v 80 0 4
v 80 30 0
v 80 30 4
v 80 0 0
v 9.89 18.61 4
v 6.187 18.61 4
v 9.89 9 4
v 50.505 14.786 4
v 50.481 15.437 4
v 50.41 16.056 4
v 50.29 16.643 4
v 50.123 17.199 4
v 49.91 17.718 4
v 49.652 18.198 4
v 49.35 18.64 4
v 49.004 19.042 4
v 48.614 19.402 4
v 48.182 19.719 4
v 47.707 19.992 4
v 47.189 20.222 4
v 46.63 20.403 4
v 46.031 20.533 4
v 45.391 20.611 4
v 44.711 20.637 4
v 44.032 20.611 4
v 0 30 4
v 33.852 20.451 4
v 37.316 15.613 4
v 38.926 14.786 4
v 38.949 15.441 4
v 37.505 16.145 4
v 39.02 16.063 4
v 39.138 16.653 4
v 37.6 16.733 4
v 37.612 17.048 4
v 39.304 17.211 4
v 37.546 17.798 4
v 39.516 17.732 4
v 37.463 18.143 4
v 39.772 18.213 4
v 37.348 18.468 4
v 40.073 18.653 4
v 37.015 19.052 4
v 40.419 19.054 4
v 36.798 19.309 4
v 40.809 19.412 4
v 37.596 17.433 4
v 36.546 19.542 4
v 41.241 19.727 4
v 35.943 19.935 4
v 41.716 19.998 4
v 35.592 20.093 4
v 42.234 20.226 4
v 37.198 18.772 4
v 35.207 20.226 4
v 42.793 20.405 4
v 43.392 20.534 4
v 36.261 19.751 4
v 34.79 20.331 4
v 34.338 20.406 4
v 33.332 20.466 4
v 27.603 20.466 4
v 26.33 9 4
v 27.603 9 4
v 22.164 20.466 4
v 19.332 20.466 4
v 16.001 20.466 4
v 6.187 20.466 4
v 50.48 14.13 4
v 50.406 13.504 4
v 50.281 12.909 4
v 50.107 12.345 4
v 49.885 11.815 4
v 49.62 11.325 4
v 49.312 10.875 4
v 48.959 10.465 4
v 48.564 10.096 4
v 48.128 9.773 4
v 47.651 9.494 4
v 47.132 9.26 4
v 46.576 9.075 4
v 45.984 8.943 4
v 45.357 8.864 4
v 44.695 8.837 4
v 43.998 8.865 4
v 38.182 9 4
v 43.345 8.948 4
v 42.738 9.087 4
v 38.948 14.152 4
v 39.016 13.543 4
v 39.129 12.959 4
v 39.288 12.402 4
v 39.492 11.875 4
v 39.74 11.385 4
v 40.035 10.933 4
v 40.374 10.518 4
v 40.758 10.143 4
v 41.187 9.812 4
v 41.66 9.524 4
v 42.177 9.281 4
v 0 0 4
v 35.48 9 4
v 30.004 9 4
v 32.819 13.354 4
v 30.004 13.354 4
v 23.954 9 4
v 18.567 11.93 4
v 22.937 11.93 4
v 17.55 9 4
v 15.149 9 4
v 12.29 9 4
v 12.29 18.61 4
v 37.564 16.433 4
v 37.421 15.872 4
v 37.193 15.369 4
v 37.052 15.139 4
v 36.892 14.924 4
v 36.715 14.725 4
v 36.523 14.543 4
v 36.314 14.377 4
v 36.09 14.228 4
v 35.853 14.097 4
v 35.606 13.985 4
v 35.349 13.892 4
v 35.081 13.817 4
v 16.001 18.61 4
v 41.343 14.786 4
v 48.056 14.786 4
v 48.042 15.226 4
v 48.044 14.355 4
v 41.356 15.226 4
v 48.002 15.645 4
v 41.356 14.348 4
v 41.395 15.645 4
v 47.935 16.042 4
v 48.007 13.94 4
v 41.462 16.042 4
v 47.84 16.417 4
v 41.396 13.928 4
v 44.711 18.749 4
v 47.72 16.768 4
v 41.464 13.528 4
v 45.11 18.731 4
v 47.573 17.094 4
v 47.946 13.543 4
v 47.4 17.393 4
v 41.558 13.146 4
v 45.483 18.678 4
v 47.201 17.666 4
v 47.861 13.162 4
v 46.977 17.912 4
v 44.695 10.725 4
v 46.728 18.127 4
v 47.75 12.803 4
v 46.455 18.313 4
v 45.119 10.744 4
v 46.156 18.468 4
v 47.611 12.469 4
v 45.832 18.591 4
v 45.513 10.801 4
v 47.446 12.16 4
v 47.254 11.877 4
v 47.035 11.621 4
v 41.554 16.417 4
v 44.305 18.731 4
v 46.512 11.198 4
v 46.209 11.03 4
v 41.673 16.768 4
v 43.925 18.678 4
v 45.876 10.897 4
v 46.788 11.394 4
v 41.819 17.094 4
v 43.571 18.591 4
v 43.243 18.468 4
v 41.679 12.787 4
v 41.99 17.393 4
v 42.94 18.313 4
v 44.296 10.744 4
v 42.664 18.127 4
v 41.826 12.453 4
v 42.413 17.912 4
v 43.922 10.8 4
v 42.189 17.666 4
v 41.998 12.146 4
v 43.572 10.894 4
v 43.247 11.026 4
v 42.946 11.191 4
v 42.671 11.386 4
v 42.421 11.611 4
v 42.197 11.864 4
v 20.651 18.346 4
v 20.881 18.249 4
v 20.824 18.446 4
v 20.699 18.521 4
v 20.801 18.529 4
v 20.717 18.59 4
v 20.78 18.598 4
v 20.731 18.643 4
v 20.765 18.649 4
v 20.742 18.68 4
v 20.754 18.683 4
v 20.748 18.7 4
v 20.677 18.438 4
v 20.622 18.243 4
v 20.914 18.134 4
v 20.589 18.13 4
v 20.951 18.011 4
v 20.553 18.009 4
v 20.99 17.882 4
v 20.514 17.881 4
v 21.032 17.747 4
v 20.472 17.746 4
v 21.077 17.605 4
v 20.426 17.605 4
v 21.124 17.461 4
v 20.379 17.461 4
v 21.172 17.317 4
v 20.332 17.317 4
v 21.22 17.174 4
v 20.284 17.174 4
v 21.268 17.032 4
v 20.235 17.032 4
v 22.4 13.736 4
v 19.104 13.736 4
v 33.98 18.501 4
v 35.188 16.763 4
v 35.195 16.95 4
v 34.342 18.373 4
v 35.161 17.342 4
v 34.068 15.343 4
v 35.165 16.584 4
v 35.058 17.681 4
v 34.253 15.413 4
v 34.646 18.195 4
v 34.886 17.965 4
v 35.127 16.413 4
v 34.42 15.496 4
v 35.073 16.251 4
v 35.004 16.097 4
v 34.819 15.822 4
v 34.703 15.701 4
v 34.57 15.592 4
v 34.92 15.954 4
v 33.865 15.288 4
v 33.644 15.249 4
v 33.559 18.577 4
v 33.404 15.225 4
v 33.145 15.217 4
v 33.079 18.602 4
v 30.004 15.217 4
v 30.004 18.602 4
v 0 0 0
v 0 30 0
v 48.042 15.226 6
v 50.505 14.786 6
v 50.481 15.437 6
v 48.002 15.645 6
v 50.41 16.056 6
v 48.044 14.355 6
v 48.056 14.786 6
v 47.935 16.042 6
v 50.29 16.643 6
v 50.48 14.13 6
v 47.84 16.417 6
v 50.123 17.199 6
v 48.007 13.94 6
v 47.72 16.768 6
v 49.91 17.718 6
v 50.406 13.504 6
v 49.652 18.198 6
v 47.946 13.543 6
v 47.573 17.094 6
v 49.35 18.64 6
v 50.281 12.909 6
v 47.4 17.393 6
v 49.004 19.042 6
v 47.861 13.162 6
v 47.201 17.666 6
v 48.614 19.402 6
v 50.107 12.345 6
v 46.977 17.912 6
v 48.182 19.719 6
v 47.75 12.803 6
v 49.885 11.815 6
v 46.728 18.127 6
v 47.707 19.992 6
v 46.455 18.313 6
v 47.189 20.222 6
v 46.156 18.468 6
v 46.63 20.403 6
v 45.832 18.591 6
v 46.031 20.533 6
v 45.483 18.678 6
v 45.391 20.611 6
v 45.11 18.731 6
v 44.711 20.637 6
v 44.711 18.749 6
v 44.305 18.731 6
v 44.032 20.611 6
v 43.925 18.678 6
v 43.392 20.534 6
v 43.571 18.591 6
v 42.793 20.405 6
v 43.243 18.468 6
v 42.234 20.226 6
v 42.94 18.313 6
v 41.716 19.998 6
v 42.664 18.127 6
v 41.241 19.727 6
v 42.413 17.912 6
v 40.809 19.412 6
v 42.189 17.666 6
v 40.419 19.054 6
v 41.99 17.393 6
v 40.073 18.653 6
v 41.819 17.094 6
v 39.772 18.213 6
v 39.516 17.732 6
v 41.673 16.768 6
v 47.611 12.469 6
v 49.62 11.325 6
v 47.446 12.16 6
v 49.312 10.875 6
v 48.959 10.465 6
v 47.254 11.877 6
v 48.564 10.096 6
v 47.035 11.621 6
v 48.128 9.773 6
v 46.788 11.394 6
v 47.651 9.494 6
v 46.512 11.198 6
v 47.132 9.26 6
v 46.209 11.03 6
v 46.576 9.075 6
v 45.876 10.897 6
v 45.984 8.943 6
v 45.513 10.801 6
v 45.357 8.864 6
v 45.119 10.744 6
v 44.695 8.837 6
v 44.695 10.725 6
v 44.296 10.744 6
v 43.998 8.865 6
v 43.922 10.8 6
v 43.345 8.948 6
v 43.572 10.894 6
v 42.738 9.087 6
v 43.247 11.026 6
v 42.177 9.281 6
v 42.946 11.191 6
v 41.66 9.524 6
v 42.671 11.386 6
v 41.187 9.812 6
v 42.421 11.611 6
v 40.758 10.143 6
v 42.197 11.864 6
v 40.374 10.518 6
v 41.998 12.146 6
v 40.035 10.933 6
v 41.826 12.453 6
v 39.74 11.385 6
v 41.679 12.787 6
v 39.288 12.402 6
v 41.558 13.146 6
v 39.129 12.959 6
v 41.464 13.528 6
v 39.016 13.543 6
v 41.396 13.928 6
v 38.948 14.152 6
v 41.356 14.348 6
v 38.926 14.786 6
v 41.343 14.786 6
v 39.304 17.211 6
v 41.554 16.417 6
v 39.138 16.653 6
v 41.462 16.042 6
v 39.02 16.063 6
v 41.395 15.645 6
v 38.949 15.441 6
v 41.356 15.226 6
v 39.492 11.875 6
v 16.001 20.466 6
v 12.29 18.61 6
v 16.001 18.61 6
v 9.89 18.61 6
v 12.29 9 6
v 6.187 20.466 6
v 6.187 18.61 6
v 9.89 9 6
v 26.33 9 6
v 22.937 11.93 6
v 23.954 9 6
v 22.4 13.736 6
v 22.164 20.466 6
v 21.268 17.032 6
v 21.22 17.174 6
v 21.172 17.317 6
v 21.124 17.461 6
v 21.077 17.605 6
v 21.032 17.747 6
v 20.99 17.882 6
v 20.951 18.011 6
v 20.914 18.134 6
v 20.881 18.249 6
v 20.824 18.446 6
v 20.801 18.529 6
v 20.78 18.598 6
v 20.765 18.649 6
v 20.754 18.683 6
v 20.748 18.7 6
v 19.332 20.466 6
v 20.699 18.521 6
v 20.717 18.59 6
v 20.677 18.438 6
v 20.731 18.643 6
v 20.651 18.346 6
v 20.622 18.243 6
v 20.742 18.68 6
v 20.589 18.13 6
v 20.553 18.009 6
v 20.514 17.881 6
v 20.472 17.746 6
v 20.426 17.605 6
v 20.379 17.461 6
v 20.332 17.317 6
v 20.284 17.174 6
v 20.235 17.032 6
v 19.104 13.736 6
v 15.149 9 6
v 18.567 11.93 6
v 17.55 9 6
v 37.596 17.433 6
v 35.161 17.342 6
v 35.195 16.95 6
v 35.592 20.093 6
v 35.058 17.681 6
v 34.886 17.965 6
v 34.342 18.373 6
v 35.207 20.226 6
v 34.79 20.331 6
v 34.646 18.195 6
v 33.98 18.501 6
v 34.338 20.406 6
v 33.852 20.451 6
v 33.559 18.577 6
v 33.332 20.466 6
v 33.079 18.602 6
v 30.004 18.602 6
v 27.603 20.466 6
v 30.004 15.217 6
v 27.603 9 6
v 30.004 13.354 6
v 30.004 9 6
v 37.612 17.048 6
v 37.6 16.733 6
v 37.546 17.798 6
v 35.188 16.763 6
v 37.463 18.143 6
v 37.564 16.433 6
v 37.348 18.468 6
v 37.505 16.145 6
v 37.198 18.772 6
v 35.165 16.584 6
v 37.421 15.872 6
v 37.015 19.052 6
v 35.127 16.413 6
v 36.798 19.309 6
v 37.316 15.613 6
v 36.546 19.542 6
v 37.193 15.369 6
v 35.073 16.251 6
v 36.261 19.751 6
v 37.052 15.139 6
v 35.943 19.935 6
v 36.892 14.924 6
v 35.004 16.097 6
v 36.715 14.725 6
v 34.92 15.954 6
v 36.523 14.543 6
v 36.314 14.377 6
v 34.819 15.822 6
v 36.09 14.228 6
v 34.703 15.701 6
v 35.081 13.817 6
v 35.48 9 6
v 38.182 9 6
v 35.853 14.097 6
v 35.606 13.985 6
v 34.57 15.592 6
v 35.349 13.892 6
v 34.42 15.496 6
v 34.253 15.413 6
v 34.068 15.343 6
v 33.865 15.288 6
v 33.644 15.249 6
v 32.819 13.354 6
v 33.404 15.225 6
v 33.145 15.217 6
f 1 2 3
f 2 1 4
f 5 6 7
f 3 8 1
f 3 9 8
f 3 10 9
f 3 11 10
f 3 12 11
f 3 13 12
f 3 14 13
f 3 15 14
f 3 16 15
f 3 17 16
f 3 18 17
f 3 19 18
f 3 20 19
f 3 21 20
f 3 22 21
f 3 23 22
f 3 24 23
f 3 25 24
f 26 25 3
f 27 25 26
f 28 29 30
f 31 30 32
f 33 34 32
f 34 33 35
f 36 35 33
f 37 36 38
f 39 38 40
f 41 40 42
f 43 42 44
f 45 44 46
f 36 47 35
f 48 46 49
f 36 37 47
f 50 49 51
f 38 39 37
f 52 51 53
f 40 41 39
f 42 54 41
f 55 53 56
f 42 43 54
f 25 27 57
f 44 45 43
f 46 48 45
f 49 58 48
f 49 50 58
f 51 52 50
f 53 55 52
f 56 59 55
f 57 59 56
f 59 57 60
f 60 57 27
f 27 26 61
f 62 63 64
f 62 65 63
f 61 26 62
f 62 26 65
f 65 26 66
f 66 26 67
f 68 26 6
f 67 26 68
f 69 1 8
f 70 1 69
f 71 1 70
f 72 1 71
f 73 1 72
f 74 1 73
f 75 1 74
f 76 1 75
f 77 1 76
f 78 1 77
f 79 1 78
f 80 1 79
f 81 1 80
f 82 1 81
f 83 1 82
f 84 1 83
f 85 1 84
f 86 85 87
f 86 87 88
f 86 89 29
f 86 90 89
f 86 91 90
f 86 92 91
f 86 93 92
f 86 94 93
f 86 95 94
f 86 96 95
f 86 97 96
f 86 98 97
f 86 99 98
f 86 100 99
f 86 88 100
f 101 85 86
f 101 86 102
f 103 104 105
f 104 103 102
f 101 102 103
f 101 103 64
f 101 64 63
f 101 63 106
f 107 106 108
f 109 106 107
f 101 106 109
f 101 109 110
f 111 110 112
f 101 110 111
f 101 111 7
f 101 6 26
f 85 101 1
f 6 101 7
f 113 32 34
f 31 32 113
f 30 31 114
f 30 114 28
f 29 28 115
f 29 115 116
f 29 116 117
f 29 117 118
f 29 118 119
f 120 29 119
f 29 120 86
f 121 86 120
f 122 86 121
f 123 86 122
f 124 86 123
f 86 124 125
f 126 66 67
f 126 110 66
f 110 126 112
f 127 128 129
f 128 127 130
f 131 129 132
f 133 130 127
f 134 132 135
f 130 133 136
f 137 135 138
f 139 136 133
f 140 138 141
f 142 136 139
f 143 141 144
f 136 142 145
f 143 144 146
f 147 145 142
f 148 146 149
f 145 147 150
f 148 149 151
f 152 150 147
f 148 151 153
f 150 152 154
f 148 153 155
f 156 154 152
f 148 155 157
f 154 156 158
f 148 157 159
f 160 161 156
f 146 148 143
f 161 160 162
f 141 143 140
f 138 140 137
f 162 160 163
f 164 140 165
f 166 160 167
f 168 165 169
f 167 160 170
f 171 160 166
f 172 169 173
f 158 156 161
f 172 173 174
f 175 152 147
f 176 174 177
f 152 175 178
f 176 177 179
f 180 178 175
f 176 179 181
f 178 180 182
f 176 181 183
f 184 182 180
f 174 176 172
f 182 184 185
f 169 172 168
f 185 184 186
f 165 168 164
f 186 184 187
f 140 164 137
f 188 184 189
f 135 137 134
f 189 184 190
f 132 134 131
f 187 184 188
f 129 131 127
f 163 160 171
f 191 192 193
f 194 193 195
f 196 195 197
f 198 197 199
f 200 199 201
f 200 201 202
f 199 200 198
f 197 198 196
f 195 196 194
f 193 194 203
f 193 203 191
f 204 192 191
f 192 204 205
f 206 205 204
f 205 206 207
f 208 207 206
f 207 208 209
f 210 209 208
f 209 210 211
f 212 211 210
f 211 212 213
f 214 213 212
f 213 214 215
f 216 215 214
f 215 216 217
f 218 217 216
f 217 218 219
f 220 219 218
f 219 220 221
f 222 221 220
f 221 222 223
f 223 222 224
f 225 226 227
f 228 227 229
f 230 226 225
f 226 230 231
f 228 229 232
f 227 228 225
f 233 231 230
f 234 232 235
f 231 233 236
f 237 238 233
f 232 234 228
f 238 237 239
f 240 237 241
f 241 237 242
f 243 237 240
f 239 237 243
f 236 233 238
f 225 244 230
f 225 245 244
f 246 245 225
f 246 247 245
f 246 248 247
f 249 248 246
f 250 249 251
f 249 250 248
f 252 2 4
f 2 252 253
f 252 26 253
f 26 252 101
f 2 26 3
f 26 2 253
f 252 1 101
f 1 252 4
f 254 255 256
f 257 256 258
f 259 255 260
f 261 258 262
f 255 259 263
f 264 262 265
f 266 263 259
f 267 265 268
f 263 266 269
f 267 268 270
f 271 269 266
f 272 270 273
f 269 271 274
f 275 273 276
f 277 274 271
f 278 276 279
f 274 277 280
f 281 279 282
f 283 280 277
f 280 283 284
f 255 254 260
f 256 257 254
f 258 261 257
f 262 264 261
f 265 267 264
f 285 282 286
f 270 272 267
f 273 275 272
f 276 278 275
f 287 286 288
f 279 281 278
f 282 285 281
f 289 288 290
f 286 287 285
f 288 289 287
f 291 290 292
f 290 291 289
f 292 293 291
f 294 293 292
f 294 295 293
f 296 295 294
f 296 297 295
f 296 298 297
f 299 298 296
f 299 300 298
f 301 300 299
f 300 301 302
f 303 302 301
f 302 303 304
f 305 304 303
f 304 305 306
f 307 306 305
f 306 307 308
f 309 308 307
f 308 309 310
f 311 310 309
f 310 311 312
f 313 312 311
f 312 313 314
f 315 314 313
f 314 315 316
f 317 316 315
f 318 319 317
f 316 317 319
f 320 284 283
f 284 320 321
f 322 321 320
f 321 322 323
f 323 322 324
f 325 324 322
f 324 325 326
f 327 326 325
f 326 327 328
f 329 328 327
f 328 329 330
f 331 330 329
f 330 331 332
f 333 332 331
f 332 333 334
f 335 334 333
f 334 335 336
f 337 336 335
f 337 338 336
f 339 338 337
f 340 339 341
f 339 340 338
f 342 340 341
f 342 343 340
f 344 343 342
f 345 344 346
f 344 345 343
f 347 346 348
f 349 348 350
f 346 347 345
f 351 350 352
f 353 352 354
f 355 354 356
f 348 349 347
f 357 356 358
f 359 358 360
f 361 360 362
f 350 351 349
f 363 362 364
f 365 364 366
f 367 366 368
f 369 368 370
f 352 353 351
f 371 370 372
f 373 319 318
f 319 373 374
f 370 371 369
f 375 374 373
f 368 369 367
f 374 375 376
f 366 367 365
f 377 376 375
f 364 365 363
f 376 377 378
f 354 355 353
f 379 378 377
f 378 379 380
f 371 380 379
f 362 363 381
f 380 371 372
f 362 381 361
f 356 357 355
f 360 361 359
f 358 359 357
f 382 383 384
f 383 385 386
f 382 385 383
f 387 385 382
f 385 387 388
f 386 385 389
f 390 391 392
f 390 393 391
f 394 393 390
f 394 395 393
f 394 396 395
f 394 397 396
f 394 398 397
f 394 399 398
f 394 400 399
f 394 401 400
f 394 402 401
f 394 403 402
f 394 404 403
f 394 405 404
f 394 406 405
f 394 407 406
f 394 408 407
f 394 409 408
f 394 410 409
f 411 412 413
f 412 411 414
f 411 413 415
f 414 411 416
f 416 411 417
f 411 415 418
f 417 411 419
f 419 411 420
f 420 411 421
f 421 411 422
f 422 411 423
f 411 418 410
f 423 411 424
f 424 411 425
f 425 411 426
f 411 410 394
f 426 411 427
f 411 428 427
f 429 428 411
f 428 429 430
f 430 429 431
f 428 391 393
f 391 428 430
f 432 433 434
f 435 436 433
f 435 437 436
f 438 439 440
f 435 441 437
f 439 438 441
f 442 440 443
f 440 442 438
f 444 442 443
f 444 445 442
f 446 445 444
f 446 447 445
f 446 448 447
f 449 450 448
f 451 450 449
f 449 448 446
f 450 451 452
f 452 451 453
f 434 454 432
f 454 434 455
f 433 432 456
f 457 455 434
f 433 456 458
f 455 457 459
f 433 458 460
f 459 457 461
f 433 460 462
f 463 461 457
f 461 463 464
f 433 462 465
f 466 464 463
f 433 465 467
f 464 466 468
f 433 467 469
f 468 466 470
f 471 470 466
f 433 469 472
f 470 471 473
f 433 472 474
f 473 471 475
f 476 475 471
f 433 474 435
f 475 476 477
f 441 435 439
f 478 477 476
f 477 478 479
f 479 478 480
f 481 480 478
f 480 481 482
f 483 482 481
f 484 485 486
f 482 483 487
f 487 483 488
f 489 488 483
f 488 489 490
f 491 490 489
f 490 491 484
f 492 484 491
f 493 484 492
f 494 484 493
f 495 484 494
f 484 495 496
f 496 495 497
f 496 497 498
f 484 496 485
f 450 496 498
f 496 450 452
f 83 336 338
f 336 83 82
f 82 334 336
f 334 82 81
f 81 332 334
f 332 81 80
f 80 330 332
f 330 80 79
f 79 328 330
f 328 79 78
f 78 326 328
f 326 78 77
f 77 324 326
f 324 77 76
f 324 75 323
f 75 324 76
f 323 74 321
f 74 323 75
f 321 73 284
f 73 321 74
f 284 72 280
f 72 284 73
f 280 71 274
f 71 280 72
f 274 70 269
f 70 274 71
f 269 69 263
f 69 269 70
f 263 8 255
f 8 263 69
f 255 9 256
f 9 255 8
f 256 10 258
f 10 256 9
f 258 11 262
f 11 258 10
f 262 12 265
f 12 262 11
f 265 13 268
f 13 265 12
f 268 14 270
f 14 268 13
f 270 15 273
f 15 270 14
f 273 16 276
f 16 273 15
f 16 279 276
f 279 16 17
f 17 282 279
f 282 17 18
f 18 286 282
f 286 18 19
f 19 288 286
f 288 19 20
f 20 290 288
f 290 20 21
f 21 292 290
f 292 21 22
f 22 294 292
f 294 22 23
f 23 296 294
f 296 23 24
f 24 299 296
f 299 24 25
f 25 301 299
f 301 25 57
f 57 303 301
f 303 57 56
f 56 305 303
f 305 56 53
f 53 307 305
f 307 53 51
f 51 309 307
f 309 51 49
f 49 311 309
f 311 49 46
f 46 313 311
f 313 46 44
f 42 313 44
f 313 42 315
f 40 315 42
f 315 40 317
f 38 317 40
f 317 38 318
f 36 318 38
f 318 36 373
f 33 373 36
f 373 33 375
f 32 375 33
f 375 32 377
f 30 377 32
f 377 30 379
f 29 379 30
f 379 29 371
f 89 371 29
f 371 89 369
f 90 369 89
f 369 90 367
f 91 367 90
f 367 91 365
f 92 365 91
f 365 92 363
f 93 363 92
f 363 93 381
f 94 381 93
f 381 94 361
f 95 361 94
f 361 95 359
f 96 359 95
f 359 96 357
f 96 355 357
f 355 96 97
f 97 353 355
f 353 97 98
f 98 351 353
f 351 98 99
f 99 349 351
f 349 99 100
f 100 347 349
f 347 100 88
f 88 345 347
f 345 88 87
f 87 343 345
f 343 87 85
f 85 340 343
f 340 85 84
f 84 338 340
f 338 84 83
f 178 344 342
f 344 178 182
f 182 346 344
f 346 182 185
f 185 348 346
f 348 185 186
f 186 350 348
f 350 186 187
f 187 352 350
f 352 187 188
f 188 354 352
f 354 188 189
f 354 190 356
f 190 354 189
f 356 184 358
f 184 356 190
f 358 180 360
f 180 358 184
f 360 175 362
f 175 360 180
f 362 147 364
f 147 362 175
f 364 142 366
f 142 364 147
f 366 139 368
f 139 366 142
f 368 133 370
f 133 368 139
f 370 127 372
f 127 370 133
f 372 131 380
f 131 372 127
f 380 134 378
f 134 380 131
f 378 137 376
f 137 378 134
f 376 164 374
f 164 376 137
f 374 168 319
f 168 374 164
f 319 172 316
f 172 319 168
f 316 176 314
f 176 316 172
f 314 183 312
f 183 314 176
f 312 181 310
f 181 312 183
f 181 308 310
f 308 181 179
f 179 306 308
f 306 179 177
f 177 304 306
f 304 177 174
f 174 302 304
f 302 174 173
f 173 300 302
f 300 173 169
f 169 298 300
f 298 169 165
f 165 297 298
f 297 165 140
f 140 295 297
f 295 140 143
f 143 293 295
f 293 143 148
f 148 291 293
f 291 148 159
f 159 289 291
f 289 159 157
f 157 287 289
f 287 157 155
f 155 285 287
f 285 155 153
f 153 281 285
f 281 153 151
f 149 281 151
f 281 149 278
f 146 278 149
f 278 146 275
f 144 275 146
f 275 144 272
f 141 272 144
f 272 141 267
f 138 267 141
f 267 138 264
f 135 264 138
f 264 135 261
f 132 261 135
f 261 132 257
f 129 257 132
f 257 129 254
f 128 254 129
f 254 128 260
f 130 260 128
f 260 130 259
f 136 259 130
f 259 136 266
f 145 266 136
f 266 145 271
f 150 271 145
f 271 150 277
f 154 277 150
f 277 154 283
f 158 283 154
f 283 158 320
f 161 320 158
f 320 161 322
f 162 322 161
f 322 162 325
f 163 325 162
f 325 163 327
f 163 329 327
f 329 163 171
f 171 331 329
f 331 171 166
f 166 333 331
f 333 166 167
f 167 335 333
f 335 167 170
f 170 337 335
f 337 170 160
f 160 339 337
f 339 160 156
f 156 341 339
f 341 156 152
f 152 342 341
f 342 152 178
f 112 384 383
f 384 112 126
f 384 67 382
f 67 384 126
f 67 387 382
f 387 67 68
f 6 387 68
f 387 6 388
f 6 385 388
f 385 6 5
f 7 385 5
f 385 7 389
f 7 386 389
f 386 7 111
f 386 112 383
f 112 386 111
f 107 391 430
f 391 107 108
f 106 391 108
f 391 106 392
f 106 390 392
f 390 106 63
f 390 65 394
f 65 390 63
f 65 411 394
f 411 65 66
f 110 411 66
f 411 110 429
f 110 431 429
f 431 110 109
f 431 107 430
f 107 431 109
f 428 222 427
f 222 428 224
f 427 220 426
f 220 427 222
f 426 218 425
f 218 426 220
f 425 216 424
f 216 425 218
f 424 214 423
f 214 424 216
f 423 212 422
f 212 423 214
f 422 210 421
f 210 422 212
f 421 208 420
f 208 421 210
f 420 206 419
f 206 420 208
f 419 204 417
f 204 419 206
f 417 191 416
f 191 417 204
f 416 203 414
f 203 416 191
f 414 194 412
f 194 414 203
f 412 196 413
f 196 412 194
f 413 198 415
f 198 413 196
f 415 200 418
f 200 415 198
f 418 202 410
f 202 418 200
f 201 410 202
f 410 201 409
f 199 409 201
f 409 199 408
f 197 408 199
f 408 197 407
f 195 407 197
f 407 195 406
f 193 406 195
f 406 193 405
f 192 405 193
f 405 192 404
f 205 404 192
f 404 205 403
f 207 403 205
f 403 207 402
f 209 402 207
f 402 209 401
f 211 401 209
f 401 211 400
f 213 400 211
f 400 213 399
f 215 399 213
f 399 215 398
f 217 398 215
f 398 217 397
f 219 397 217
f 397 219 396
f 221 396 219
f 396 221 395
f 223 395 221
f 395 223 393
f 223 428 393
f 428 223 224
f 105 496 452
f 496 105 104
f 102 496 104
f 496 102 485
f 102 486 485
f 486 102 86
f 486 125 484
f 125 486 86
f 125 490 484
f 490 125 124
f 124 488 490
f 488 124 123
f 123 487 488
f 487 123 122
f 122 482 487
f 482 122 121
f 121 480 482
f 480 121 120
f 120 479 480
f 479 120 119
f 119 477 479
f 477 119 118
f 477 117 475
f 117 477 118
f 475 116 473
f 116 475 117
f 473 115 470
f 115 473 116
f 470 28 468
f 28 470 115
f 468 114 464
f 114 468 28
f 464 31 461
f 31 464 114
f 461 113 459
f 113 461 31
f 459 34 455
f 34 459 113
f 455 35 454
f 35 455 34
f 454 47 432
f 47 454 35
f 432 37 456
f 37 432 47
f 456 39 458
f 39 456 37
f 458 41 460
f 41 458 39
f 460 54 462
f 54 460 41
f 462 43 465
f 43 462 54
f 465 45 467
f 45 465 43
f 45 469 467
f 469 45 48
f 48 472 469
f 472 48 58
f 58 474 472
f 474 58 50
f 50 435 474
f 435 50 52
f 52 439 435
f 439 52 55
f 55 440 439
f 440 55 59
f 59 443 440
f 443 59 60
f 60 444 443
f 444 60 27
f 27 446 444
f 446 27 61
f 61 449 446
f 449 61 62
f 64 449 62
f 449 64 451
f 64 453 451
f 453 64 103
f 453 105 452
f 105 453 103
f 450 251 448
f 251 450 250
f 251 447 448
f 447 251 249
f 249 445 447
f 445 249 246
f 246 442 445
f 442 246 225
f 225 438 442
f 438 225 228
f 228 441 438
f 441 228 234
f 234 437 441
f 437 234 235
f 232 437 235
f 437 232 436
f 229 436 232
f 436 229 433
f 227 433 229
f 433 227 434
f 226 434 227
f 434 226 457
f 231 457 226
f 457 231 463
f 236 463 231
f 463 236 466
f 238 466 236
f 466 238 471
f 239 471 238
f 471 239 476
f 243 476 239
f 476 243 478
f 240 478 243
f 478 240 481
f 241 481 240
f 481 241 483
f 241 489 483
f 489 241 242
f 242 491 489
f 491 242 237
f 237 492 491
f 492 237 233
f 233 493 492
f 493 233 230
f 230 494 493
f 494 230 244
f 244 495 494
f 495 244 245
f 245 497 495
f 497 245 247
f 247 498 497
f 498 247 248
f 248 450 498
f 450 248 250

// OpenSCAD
// ===== 例題2: ネームプレート =====
// 土台のプレートに、自分の名前を浮き出させます。
// quote("")の中の文字を、自分の名前に書きかえてください。

plate_w = 80;   // プレートのよこ幅(mm)
plate_d = 30;   // プレートのおくゆき(mm)
plate_h = 4;    // プレートのあつさ(mm)

// 土台プレート
cube([plate_w, plate_d, plate_h]);

// 文字を上に乗せる
translate([6, 9, plate_h])           // 文字の位置（左下から）
  linear_extrude(height = 2)         // 文字のあつみ(mm)
    text("TARO", size = 12, font = "Liberation Sans:style=Bold");
